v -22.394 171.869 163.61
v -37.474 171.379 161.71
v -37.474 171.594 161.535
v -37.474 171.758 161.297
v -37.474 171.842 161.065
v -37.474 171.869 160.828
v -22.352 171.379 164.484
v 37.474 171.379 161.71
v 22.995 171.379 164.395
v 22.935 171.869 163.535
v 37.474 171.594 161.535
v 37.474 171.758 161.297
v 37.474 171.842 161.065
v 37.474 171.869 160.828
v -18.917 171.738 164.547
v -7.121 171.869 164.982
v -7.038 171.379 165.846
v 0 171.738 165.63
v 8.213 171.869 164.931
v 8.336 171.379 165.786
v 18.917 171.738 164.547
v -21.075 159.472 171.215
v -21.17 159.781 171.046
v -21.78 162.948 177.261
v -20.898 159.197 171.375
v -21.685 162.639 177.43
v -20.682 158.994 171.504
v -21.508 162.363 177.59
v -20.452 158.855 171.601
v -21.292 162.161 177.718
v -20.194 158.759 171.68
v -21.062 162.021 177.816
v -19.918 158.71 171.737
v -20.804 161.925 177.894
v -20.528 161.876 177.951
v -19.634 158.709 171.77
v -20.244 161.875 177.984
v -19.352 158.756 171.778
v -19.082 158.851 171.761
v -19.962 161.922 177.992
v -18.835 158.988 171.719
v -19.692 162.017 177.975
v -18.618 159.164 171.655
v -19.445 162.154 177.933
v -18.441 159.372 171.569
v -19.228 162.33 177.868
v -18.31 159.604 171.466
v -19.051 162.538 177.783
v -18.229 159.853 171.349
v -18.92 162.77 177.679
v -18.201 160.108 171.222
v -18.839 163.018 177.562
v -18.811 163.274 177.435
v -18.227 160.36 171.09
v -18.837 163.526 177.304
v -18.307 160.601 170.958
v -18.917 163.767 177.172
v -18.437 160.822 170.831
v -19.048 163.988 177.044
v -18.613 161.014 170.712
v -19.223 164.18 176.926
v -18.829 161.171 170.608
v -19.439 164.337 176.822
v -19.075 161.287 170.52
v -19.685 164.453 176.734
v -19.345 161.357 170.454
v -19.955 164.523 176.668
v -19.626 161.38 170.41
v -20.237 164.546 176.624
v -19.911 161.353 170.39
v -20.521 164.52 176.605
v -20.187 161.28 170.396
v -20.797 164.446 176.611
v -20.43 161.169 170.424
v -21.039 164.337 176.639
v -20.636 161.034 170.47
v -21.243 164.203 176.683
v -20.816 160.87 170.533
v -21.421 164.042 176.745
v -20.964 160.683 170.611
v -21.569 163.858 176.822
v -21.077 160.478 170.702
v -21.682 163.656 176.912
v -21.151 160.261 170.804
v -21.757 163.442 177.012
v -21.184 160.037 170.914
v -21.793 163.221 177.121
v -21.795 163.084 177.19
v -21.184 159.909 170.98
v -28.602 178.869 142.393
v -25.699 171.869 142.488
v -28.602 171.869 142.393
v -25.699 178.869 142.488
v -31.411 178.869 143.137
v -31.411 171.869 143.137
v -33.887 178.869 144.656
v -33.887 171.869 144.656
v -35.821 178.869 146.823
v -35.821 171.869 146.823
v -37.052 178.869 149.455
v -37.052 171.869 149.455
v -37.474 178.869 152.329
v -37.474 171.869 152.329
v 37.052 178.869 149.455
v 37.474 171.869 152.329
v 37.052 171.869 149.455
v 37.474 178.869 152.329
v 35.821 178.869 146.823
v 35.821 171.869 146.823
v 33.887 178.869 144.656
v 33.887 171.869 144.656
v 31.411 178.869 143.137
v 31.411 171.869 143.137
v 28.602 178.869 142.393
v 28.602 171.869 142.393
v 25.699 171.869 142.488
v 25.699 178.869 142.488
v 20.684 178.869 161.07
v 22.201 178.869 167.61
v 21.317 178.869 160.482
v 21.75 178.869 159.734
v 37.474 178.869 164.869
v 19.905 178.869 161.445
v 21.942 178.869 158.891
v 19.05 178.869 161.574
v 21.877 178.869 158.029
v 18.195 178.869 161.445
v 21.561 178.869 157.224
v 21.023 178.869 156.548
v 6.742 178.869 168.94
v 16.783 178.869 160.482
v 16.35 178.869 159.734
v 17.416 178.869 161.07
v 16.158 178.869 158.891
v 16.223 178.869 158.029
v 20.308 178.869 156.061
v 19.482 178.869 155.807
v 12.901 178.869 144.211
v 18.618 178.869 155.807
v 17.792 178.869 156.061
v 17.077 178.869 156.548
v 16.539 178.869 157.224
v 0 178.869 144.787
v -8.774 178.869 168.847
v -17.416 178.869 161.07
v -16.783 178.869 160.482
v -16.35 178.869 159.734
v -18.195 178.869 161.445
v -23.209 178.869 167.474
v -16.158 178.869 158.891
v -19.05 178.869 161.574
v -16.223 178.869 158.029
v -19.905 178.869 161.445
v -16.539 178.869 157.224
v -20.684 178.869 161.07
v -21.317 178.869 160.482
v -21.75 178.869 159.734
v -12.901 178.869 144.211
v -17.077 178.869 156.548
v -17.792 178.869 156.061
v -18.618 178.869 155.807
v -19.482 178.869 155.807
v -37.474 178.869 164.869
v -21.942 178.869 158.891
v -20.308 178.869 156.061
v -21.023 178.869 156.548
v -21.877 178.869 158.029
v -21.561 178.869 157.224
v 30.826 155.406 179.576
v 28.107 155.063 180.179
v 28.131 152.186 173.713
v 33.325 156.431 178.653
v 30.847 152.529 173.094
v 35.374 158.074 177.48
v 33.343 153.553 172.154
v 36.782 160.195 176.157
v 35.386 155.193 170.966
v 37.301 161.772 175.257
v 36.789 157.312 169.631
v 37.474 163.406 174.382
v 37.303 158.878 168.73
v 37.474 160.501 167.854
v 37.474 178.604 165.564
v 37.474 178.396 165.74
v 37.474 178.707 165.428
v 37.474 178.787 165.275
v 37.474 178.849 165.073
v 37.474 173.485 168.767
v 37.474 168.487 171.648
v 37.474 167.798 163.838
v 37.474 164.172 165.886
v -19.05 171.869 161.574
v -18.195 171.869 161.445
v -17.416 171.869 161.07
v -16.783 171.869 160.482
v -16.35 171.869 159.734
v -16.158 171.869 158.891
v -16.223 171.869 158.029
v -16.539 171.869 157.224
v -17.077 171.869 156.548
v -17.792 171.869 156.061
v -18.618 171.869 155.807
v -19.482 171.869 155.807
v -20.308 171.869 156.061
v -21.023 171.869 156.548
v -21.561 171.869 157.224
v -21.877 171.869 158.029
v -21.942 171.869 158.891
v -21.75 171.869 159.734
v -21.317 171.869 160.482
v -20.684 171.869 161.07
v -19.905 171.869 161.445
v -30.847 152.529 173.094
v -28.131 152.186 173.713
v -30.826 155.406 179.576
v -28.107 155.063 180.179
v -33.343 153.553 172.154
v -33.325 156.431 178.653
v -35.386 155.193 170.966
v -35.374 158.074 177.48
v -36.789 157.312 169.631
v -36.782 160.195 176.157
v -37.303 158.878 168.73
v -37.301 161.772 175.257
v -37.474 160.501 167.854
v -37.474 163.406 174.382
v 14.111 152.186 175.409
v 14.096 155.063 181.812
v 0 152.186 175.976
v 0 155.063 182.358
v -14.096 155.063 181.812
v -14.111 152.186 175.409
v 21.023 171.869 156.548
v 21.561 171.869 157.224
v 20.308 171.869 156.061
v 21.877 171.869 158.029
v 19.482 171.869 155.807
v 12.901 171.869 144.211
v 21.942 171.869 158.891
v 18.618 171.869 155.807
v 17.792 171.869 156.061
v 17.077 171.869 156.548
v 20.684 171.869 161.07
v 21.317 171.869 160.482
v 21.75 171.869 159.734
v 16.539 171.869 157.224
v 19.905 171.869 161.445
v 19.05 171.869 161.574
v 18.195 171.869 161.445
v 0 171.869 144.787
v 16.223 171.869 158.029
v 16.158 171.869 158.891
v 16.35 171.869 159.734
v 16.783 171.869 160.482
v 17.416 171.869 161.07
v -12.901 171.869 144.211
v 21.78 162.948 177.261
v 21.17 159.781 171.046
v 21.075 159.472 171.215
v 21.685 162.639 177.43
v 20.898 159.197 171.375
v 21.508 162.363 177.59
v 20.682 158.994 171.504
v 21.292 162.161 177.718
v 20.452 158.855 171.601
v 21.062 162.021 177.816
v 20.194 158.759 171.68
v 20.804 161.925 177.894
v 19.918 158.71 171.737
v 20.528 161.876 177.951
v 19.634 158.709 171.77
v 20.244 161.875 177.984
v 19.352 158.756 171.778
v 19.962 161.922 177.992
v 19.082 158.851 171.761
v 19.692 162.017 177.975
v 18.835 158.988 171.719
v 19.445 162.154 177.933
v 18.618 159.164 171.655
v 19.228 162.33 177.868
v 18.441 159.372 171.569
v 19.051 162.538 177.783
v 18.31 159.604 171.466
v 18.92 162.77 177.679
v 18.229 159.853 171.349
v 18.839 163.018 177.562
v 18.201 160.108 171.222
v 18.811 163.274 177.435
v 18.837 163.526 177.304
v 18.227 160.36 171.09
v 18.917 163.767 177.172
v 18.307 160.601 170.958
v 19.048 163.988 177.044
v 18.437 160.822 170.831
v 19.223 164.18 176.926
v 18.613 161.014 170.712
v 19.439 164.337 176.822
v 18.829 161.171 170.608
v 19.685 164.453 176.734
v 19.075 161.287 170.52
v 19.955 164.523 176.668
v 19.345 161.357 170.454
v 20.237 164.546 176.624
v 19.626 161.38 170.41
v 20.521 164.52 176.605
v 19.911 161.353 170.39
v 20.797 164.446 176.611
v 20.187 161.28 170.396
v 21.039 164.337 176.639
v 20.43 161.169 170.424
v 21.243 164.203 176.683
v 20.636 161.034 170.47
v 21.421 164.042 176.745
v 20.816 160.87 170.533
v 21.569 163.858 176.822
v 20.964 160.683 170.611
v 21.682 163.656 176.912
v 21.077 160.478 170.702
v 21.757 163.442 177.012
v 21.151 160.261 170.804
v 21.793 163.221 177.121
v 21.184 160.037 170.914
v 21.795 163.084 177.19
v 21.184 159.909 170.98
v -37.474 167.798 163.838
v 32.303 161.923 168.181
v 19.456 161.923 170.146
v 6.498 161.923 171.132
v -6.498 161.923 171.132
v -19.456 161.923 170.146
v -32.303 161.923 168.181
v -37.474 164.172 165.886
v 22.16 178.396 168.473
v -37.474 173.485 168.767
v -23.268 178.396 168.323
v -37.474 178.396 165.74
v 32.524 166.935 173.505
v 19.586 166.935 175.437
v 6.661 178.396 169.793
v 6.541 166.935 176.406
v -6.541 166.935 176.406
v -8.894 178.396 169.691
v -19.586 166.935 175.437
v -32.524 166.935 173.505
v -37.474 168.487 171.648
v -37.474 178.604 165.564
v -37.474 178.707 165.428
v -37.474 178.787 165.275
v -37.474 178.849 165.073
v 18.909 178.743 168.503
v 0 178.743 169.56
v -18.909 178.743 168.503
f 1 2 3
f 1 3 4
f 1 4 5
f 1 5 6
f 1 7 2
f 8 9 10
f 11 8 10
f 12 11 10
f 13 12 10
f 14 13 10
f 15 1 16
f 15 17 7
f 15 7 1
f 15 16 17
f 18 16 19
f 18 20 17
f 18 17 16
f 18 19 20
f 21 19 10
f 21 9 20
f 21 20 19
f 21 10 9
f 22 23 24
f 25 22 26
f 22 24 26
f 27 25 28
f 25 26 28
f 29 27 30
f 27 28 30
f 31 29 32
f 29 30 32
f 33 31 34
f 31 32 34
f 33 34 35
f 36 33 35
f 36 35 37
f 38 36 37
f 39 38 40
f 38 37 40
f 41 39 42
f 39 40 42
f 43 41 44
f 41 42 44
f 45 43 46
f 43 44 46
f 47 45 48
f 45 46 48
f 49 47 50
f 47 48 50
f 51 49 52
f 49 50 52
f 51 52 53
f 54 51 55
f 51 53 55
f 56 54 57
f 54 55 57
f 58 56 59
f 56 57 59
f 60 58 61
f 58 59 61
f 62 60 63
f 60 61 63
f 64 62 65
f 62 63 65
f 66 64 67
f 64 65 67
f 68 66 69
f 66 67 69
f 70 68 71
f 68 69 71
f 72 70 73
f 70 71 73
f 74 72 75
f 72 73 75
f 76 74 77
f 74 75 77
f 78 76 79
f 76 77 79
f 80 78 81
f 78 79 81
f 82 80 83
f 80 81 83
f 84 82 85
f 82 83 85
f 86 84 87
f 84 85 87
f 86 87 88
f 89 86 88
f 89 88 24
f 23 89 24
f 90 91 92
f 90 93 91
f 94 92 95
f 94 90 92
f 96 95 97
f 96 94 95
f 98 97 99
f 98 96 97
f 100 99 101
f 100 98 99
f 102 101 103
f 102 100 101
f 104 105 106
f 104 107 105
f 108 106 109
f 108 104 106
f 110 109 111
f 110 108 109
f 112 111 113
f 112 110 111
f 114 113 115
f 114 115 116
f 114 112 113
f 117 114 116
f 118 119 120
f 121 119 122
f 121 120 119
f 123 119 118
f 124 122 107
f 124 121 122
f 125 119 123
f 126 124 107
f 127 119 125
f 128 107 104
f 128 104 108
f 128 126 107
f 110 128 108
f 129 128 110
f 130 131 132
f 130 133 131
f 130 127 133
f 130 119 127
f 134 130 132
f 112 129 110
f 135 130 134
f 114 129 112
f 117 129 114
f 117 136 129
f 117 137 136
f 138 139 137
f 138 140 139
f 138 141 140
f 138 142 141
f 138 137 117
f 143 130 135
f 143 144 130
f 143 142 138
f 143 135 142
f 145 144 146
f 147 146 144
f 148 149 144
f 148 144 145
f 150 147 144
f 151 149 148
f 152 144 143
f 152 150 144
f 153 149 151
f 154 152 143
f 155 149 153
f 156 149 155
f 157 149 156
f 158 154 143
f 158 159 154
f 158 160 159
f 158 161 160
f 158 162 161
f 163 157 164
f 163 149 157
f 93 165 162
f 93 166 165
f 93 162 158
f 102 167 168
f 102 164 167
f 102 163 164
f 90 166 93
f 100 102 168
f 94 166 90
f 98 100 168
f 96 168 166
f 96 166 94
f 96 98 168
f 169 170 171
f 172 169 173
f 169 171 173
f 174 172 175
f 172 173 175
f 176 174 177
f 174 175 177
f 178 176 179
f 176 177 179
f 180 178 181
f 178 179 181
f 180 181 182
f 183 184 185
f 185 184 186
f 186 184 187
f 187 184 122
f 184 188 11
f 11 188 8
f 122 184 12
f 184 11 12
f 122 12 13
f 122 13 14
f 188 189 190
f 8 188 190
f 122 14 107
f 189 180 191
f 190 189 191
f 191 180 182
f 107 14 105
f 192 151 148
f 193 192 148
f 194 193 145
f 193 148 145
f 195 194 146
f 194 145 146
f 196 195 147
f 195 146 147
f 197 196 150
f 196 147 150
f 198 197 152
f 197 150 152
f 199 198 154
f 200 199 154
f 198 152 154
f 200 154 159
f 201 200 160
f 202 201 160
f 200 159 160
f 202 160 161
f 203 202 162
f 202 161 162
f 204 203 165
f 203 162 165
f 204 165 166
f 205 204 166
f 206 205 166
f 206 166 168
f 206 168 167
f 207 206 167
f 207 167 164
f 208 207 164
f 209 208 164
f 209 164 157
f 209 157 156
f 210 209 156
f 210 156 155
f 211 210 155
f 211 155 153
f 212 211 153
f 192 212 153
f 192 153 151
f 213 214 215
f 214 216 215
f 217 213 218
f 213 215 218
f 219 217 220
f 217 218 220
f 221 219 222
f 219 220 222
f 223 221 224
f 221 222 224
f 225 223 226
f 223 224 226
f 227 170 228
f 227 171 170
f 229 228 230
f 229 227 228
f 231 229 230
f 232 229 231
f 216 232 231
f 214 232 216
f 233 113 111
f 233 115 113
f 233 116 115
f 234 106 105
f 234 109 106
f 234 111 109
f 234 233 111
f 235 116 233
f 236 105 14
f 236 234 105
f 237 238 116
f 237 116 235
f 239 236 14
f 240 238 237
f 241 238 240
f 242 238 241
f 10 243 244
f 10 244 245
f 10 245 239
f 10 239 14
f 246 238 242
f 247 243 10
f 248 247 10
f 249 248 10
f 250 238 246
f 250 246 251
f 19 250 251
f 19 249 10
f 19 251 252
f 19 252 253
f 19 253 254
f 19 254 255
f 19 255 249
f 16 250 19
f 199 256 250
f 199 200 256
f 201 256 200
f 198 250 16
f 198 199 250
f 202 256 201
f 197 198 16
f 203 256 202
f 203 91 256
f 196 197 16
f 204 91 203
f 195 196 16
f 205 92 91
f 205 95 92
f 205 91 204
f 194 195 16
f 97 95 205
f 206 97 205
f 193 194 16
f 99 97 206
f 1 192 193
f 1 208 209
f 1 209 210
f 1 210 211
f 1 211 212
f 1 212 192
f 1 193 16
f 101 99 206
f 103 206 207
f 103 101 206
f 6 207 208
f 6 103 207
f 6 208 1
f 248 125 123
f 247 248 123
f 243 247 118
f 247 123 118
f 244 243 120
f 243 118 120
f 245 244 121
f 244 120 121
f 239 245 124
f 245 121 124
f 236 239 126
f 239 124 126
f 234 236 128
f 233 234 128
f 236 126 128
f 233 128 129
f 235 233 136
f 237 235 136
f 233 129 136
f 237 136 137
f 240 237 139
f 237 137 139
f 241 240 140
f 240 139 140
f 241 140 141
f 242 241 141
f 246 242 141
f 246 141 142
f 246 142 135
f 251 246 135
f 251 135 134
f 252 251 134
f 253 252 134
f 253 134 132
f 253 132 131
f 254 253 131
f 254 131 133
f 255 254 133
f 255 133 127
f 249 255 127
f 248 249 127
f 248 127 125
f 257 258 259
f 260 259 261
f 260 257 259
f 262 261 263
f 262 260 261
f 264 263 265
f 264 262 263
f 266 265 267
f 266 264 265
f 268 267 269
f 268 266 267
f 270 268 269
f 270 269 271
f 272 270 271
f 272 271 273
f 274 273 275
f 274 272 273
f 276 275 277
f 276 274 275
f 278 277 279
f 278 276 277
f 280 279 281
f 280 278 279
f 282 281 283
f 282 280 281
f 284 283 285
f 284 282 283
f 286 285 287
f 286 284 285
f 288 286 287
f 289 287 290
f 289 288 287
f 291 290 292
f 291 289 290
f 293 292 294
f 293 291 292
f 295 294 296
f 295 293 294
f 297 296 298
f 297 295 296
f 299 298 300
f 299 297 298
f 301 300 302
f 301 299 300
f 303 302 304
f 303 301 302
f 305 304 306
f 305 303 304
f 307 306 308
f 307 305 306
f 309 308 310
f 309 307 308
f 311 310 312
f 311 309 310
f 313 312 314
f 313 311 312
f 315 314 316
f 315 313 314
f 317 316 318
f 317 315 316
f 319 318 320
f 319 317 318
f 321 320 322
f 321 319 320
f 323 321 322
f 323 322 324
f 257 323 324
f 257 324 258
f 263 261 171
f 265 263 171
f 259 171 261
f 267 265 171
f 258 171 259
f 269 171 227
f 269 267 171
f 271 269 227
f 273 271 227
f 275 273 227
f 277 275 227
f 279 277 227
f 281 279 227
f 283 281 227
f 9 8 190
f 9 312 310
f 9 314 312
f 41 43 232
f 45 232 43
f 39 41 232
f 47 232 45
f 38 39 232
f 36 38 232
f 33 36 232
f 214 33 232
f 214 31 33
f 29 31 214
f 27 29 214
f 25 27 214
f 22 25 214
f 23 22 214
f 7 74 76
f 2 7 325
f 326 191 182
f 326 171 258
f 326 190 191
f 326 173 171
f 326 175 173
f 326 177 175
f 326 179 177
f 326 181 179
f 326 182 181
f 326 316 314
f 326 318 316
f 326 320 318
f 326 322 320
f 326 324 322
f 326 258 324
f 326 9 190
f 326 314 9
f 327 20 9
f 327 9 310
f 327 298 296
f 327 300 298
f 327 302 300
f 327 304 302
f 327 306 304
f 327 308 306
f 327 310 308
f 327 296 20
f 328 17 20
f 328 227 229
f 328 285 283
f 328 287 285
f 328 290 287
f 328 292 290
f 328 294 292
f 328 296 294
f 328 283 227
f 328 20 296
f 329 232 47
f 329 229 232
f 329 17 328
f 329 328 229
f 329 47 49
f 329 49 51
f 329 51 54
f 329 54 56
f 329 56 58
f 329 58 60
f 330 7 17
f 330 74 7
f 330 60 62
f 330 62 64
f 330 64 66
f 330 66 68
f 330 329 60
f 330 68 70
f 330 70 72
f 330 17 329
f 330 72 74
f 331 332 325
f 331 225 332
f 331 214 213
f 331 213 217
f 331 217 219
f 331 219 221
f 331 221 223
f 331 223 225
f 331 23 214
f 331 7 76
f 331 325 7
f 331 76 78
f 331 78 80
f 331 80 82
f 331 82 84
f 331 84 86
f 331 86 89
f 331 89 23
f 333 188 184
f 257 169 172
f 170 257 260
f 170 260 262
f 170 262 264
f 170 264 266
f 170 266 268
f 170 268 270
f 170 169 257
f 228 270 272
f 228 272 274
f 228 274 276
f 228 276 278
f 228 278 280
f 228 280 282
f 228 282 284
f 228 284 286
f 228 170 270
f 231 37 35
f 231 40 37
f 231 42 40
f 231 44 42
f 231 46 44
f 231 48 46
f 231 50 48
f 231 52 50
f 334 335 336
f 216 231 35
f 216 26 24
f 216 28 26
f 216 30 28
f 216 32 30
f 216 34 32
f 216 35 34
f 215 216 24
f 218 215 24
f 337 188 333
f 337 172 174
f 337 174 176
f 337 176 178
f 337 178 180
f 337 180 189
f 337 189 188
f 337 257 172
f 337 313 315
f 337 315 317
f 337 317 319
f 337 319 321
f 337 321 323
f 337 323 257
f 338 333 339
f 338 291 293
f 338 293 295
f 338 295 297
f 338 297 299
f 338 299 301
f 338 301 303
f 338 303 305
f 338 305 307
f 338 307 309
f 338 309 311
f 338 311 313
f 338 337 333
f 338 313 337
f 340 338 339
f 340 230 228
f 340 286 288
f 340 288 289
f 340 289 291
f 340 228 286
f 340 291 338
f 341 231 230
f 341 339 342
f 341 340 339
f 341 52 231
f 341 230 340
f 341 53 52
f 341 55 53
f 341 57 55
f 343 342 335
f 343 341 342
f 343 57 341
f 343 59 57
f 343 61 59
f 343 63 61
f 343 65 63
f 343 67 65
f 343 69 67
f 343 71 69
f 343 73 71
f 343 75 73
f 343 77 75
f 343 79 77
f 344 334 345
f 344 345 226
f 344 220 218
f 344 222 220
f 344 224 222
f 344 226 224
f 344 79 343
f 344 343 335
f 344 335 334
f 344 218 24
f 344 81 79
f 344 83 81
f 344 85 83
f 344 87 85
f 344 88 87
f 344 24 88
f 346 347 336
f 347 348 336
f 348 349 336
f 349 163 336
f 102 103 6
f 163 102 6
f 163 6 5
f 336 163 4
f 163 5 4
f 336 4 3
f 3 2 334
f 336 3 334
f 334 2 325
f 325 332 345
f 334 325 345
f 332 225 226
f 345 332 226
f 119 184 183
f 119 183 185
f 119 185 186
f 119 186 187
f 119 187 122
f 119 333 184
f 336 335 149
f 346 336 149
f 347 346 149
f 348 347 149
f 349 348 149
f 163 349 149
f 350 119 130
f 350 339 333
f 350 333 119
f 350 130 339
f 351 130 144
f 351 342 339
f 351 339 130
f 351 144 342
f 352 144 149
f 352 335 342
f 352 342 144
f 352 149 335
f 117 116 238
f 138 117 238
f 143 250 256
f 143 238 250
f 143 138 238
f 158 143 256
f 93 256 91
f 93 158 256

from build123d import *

# Parameters (mm, degrees)
REVOLVE1_ANGLE     = 30.000000000000068
SKETCH5_OUTSIDE_W  = 117.778
SKETCH5_OUTSIDE_H  = 65.886
CUT_EXTRUDE2_DEPTH = 260.76149135356775
FILLET1_R          = 10
FILLET2_R          = 1
SKETCH6_R          = 2.9000000000000363
CUT_EXTRUDE3_DEPTH = 189.07070419365607


with BuildPart() as part:
    # Sketch1 → Revolve1 (revolve, symmetric)
    with BuildSketch(Plane(origin=(0, 0, 0), x_dir=(0, 0, -1), z_dir=(1, 0, 0))) as revolve1_sk:
        with BuildLine():
            Line((-182.35774731109075, 155.06255495822683), (-175.97602387063264, 152.18616730537))
            ThreePointArc((-175.97602387063264, 152.18616730537), (-171.12326361620543, 162.17531665611477), (-165.70405663890074, 171.86884968466347))
            Line((-165.70405663890074, 171.86884968466347), (-144.78715490957802, 171.8688496846635))
            Line((-144.78715490957802, 171.8688496846635), (-144.78715490957802, 178.86884968466353))
            Line((-144.78715490957802, 178.86884968466353), (-169.62958875117425, 178.8688496846635))
            ThreePointArc((-169.62958875117425, 178.8688496846635), (-176.3957372053048, 167.18067068421345), (-182.35774731109075, 155.06255495822683))
        make_face()
    revolve(axis=Axis((0, 0, 0), (0, 1, 0)), revolution_arc=REVOLVE1_ANGLE / 2)
    revolve(revolve1_sk.sketch, axis=Axis((0, 0, 0), (0, -1, 0)), revolution_arc=REVOLVE1_ANGLE / 2)

    # Sketch4 → Cut-Revolve1 (revolve, cut)
    with BuildSketch(Plane(origin=(0, 57.85077924674397, -29.47644429930001), x_dir=(0, 0.4539904997395446, 0.891006524188369), z_dir=(0, -0.891006524188369, 0.4539904997395446)), mode=Mode.PRIVATE) as cut_revolve1_sk:
        Polygon((200.3216852155454, 19.031606271083962), (239.0176946479082, 22.417068420107935), (239.1484282620297, 20.922776372970326), (200.4524188296669, 17.53731422394635), align=None)
    cut_revolve1 = revolve(cut_revolve1_sk.sketch.rotate(Axis((-17.53731422394635, 148.85427304522494, 149.12796866727265), (-0.08715574274765833, 0.4522629288245563, 0.8876159753616077)), 8.229125289), axis=Axis((-17.53731422394635, 148.85427304522494, 149.12796866727265), (-0.08715574274765833, 0.4522629288245563, 0.8876159753616077)), mode=Mode.SUBTRACT)

    # Mirror1: Cut-Revolve1 across plane
    add(cut_revolve1.mirror(Plane(origin=(0, 0, 0), x_dir=(0, 0, 1), z_dir=(1, 0, 0))), mode=Mode.SUBTRACT)

    # Sketch5 outside → Cut-Extrude2 (cut, through all)
    with BuildSketch(Plane(origin=(0, 0, 0), x_dir=(1, 0, 0), z_dir=(0, 1, 0))):
        with Locations((0, -161.106)):
            Rectangle(SKETCH5_OUTSIDE_W, SKETCH5_OUTSIDE_H)
        Polygon((37.473673176807814, -139.85365224207746), (-37.473673176807814, -139.85365224207746), (-37.47367317680781, -182.35774731109072), (37.47367317680782, -182.35774731109072), align=None, mode=Mode.SUBTRACT)
    extrude(amount=CUT_EXTRUDE2_DEPTH, mode=Mode.SUBTRACT)

    # Fillet1
    fillet1_edges = [part.edges().sort_by_distance(p)[0] for p in [
        (37.47367317680782, 175.36884968466353, 139.85365224207746),
        (37.47367317680782, 153.6238703887916, 175.2030438132355),
        (-37.47367317680781, 153.6238703887916, 175.20304381323552),
        (-37.47367317680782, 175.36884968466353, 139.85365224207746),
    ]]
    fillet(fillet1_edges, radius=FILLET1_R)

    # Fillet2
    fillet2_edges = [part.edges().sort_by_distance(p)[0] for p in [
        (2.132e-14, 178.86884968466353, 169.62958875117428),
        (1.421e-14, 171.86884968466347, 165.7040566389007),
    ]]
    fillet(fillet2_edges, radius=FILLET2_R)

    # Sketch6 → Cut-Extrude3 (cut, through all)
    with BuildSketch(Plane(origin=(0, 178.8688496846635, 0), x_dir=(1, 0, 0), z_dir=(0, 1, 0))):
        with Locations(Location((19.049999999999898, -158.67424557151682, 0), (0, 0, 270))):
            Circle(SKETCH6_R)
        with Locations(Location((-19.050000000000104, -158.67424557151682, 0), (0, 0, 270))):
            Circle(SKETCH6_R)
    extrude(amount=-CUT_EXTRUDE3_DEPTH, mode=Mode.SUBTRACT)


solid = part.part
